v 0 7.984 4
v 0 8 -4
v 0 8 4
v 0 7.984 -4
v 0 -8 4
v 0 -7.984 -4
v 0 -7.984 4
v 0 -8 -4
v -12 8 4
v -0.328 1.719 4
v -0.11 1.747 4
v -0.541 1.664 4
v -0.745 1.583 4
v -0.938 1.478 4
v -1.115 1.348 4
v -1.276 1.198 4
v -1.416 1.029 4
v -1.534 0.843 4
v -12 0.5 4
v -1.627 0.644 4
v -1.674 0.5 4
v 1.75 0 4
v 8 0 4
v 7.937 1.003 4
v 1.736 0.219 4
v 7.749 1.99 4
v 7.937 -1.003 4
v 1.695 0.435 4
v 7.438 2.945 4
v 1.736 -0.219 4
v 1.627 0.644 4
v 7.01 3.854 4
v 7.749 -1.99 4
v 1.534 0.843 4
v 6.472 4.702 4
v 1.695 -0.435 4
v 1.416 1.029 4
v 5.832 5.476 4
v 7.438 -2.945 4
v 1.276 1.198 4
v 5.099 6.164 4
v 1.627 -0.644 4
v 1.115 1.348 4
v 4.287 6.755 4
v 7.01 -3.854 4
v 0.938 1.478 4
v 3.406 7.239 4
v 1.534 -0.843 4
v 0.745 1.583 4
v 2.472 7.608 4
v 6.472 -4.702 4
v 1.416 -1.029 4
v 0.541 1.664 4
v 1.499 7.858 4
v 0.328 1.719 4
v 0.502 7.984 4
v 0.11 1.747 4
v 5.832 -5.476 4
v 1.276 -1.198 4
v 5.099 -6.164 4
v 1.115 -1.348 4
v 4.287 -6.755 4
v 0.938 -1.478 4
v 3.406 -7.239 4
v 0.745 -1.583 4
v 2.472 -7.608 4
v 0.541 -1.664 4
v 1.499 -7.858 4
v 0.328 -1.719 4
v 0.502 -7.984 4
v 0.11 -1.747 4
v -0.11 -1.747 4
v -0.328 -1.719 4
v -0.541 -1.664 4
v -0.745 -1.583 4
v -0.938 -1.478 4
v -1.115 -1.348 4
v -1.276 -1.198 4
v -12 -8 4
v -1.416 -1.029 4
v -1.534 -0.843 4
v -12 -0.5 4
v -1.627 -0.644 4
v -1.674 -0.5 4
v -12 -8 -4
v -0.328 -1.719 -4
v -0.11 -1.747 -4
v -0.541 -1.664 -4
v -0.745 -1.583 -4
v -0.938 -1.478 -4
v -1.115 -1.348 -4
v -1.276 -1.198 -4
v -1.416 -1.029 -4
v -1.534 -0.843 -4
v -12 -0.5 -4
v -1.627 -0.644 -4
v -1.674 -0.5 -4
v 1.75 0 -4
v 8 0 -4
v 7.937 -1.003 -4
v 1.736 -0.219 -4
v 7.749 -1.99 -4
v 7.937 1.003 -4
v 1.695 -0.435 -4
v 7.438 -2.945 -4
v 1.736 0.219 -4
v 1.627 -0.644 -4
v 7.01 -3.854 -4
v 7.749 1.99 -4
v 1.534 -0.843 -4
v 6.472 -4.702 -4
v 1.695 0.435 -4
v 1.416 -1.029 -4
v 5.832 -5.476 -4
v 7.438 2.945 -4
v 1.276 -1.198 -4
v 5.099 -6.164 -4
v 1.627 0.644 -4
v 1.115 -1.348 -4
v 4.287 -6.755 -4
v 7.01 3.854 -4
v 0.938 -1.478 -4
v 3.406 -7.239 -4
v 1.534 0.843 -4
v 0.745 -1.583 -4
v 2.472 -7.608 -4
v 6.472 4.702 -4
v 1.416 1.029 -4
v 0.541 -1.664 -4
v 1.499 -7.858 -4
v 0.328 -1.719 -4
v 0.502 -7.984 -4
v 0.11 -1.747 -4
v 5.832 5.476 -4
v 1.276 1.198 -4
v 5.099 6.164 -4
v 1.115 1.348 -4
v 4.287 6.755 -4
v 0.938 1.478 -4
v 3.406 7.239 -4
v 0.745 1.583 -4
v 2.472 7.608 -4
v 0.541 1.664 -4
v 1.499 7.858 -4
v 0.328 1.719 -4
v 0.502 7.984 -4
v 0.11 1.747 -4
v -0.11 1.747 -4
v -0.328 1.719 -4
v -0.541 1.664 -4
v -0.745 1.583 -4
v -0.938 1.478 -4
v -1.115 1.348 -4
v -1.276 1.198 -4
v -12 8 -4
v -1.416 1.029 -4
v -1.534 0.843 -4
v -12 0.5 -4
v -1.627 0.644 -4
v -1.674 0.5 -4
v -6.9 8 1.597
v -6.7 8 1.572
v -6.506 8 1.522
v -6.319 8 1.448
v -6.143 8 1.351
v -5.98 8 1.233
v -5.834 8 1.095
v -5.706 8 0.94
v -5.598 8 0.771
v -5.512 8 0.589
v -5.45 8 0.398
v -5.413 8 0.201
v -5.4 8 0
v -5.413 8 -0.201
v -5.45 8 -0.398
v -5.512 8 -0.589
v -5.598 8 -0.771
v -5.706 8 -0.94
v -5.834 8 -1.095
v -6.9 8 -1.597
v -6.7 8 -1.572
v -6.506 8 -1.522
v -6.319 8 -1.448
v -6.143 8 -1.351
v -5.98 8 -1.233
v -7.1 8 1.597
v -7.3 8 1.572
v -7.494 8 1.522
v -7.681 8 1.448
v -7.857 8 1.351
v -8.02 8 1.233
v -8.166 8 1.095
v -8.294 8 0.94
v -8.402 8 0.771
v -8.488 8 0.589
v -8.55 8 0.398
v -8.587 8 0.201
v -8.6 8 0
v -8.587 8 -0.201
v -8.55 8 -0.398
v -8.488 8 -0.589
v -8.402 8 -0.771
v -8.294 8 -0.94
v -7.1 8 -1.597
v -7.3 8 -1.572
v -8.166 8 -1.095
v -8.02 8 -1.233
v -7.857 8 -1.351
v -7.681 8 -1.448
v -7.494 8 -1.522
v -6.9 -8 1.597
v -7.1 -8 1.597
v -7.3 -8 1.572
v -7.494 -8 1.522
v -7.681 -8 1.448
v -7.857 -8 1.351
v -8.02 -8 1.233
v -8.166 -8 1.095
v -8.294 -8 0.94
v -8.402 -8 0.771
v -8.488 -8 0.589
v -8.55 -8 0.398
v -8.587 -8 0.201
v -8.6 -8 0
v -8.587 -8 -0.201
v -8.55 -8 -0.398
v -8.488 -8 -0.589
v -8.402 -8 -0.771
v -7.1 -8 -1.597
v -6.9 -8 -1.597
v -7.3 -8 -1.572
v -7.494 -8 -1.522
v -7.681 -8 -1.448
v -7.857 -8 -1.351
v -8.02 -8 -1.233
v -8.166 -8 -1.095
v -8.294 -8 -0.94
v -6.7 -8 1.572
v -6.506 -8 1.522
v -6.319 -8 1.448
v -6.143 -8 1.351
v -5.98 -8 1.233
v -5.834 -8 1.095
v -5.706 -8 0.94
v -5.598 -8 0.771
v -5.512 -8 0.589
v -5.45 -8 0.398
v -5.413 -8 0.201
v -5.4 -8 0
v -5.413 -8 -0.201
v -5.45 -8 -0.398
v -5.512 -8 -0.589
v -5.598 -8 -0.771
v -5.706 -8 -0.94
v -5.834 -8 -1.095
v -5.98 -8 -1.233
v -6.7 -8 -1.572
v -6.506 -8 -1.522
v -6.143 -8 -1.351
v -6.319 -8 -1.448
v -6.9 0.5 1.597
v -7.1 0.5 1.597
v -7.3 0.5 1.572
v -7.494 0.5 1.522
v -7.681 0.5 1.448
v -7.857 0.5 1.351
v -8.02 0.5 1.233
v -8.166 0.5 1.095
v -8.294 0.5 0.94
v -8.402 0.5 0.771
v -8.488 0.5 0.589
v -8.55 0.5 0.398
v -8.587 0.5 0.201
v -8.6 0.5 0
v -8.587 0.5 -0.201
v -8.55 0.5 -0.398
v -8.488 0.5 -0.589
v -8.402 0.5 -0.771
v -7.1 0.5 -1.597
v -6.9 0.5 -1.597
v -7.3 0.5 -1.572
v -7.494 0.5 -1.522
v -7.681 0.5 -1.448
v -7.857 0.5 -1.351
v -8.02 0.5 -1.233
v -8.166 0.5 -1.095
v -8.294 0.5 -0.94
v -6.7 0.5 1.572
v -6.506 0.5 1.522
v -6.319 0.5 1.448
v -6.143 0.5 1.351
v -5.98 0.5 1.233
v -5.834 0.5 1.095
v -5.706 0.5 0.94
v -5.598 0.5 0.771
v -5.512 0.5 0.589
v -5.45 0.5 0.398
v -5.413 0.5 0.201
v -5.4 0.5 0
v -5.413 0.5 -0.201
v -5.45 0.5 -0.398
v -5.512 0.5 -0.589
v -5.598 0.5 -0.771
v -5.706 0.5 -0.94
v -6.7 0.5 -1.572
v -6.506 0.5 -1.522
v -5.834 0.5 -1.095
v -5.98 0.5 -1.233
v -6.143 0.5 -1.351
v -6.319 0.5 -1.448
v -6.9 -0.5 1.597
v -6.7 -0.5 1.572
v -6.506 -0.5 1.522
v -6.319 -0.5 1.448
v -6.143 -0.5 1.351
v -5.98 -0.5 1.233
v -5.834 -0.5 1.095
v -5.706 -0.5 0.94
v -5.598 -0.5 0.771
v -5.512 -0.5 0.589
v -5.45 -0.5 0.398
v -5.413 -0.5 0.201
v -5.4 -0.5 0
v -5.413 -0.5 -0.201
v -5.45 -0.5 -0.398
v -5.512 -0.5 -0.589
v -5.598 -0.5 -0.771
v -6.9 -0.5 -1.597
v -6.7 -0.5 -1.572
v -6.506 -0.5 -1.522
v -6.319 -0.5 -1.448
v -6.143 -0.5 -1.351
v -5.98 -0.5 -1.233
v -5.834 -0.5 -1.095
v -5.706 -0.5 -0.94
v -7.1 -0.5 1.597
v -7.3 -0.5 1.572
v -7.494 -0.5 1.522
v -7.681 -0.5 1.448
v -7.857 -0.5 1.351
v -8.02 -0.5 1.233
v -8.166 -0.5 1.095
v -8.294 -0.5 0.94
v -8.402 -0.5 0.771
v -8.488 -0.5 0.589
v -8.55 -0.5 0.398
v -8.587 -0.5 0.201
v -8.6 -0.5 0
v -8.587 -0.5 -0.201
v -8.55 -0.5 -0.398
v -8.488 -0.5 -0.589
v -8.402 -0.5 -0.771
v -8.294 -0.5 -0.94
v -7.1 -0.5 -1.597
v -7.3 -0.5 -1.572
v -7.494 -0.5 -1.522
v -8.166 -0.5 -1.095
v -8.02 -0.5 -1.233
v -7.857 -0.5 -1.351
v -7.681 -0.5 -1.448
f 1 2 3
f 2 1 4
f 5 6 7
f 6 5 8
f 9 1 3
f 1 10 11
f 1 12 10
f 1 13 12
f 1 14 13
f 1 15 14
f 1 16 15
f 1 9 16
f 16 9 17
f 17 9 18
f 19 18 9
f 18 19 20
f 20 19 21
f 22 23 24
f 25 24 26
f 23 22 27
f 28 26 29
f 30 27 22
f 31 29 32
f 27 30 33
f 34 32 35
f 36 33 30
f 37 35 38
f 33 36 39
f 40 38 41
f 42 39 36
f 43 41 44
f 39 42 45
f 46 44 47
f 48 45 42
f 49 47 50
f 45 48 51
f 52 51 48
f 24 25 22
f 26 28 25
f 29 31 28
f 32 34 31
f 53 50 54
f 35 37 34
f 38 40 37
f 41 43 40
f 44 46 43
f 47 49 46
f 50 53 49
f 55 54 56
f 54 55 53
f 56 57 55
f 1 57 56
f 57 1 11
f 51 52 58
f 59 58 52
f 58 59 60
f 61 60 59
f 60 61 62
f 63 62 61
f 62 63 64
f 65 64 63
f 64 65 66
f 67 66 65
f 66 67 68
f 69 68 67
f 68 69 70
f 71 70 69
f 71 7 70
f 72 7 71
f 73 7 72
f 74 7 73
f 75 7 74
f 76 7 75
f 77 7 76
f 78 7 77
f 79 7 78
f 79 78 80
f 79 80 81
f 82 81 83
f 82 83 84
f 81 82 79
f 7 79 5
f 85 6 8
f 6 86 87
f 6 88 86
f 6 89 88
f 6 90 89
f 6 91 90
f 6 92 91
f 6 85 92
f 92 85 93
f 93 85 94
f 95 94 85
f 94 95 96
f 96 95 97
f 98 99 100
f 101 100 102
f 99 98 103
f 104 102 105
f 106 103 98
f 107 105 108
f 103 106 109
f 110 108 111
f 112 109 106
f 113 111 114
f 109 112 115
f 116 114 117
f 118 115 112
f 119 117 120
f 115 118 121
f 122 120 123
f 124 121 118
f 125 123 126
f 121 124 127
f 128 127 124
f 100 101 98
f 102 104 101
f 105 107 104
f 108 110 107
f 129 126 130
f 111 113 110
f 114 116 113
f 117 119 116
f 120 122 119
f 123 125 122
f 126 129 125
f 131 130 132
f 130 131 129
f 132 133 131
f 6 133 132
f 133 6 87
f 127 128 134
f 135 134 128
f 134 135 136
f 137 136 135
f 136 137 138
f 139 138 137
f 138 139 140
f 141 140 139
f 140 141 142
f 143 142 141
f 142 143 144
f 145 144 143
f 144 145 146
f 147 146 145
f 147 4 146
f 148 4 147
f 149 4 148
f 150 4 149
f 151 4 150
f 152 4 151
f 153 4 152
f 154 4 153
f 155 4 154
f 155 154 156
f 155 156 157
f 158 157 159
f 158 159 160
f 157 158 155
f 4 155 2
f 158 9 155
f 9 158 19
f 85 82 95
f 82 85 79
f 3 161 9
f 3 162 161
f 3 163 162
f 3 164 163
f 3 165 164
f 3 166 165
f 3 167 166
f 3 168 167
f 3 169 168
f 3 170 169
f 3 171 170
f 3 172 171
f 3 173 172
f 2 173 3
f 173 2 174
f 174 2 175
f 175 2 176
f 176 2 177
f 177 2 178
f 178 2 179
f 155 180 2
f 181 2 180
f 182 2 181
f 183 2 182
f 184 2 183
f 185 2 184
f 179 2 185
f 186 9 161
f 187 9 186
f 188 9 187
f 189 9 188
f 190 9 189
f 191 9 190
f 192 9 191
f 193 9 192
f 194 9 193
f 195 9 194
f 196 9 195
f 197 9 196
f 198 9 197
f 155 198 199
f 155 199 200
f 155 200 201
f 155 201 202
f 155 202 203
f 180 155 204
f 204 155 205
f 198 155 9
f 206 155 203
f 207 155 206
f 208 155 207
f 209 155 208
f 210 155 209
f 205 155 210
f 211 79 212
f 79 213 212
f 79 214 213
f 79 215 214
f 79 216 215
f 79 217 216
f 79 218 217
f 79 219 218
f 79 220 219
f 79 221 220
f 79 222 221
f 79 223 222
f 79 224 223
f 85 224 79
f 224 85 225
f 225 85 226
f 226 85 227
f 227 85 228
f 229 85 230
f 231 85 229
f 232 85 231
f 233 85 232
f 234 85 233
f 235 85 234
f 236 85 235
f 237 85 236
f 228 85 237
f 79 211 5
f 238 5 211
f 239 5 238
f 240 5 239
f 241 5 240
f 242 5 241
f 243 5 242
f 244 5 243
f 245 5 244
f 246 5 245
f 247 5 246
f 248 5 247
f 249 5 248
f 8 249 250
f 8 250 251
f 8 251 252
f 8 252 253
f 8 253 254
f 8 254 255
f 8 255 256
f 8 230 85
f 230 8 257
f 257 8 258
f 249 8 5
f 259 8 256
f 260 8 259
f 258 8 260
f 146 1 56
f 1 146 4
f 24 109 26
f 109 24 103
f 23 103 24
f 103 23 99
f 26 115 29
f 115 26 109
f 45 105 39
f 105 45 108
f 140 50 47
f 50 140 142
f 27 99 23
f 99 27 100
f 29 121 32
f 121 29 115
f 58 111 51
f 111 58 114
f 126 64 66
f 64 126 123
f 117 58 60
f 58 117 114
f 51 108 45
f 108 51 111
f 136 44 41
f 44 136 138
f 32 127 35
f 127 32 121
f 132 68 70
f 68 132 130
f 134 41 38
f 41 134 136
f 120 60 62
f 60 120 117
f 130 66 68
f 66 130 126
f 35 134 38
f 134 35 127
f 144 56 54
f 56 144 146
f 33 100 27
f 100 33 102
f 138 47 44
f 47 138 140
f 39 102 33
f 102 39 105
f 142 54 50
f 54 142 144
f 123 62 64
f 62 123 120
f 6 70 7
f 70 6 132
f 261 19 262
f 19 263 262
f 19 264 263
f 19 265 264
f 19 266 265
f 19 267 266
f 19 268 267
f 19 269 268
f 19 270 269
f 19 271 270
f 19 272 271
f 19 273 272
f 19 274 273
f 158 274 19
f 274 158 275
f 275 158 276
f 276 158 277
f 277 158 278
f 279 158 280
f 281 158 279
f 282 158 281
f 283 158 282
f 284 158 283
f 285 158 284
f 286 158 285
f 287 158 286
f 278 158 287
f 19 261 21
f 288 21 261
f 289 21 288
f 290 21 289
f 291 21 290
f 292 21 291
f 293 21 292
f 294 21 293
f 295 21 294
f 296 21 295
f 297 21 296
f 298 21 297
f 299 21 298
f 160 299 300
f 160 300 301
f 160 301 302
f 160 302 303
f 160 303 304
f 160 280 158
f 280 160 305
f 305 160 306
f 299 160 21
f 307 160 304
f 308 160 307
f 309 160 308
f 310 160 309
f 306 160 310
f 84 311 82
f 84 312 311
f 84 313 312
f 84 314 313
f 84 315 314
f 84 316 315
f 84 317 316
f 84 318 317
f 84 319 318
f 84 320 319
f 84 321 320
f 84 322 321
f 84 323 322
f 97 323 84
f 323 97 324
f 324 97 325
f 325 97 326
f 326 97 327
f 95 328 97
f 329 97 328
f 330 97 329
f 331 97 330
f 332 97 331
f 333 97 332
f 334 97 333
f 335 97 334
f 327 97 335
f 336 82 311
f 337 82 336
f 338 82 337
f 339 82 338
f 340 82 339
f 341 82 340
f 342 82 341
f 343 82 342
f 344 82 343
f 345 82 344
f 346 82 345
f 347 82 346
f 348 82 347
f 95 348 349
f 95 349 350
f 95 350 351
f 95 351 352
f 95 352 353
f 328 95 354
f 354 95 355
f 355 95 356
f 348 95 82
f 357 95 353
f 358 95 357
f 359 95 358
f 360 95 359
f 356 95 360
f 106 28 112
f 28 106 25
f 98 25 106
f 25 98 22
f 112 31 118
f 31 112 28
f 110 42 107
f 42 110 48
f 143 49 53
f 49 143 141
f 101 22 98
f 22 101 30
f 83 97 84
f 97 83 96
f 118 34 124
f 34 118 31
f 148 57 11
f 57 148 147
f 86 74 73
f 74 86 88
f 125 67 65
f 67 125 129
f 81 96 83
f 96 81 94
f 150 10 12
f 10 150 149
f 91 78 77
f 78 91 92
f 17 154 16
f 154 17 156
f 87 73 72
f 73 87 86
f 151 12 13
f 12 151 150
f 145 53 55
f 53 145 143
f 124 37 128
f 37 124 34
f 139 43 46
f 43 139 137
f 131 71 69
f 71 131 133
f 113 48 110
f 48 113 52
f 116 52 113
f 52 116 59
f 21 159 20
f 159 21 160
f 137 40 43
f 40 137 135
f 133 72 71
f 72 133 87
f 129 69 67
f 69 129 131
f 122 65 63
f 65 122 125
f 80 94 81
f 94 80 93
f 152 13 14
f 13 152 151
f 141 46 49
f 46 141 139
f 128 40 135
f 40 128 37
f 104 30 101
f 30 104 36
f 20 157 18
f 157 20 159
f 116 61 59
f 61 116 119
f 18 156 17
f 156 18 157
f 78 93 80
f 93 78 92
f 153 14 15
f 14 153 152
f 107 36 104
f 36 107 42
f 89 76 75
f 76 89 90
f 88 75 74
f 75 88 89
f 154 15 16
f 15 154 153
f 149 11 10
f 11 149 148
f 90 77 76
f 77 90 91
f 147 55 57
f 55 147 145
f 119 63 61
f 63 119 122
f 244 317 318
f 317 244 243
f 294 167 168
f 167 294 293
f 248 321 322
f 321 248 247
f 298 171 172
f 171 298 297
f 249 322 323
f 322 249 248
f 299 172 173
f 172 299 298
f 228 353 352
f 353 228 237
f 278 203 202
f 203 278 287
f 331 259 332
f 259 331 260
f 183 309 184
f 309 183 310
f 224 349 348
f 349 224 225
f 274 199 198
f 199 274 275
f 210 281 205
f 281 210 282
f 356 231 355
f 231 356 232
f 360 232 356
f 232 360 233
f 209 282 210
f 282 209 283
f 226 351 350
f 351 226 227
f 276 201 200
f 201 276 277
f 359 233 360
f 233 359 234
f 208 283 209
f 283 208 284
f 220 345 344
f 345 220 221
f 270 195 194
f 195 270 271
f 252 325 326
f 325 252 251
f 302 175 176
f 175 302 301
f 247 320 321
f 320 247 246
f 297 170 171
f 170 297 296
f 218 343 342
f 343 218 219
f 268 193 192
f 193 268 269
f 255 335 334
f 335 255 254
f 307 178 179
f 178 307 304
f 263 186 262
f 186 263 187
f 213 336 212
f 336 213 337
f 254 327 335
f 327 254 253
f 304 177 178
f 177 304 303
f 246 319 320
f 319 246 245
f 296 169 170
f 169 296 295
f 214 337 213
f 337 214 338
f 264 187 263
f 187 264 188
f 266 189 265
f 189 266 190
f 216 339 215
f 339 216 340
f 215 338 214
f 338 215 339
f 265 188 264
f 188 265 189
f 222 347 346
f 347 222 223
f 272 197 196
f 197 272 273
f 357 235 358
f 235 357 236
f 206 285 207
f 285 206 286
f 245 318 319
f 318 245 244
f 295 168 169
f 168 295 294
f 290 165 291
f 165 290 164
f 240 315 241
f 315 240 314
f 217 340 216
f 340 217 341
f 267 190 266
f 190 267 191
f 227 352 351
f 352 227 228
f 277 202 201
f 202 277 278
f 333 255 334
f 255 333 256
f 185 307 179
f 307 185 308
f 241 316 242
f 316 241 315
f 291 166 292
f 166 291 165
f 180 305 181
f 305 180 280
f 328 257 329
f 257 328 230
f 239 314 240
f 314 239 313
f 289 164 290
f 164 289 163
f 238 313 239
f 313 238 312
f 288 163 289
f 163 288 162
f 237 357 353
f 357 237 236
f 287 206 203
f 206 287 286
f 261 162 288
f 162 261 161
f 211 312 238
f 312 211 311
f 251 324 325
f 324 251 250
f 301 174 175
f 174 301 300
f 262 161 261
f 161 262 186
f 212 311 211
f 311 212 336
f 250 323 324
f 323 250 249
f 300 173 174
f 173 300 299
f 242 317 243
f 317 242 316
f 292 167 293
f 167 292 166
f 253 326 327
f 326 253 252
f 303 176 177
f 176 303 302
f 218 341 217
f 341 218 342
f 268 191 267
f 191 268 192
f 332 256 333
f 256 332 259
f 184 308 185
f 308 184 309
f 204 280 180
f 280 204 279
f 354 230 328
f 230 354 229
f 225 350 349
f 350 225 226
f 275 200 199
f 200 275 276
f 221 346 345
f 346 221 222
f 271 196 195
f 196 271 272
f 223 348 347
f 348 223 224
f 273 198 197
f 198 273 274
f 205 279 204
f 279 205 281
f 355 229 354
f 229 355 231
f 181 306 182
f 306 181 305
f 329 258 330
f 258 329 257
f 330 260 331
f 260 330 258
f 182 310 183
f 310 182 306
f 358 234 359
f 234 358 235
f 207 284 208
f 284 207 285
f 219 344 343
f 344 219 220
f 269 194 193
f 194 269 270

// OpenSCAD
height=8;
radius=1.75;
difference(){
union(){
translate([-6,0,0]) cube([12,16,height],center=true);
cylinder(h=height,r=8, center=true, $fn=50);
}
translate([-10,0,0]) cube([20,1,height+4],center=true);
cylinder(h=30,r=radius, center=true, $fn=50);
translate([-7,0,0]) rotate([90,0,0]) cylinder(h=30,r=1.6, center=true, $fn=50);
}
